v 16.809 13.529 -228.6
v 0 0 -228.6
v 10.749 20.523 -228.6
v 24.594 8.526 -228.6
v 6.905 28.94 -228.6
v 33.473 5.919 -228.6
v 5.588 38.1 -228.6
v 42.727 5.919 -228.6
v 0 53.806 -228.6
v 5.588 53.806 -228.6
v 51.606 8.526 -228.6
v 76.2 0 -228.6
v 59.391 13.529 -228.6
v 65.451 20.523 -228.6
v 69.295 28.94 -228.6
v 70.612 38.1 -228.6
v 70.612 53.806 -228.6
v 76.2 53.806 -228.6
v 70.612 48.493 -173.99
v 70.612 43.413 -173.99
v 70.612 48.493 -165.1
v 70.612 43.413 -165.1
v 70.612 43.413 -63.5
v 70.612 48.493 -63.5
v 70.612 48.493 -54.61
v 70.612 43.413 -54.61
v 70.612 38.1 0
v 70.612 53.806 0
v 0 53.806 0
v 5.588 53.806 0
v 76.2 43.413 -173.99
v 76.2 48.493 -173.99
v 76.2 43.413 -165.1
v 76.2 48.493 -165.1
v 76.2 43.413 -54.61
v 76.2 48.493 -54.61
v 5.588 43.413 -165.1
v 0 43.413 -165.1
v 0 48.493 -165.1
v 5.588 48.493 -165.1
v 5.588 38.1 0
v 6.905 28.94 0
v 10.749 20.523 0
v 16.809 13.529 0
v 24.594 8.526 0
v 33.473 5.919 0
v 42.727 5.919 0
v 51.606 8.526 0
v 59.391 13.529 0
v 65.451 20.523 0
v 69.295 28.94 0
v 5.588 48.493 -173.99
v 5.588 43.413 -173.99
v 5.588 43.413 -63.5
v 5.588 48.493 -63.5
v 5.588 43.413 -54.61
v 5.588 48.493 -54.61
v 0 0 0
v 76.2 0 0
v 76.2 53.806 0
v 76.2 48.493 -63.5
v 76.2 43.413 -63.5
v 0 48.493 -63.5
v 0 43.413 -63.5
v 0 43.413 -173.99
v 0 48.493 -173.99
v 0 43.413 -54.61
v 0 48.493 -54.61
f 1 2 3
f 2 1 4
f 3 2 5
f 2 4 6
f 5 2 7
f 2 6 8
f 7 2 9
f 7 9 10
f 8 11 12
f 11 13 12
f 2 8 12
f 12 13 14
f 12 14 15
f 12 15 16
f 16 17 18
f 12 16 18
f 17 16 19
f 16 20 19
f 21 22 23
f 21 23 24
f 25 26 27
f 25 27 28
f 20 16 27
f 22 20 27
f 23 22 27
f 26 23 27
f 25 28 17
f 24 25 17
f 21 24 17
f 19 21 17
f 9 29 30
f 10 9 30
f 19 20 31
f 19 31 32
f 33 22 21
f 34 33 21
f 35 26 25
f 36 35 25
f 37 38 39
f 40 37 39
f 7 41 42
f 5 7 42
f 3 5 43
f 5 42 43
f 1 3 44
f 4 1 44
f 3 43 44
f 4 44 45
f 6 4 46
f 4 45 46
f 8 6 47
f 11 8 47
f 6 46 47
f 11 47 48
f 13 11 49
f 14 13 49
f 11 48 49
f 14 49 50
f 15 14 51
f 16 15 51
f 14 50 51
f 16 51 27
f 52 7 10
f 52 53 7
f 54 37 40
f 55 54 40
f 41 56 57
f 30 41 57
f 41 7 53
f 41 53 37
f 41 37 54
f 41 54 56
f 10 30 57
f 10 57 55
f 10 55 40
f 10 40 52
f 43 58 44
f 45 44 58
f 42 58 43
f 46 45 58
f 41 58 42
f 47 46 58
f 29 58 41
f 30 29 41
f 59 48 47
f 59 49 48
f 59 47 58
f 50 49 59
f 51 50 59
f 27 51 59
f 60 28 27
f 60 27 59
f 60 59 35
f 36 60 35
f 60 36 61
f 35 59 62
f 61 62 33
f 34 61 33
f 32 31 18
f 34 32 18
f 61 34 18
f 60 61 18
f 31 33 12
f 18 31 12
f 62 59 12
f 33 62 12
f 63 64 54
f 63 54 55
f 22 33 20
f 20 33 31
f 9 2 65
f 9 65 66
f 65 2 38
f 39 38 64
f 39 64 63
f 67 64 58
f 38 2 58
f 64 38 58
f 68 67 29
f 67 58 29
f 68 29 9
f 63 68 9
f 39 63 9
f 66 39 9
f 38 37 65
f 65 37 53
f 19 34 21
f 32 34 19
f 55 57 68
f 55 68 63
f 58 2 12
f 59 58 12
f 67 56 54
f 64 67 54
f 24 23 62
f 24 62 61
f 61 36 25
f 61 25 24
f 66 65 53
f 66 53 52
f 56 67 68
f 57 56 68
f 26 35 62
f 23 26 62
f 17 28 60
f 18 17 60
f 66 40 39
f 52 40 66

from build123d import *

# Parameters (mm, degrees)
SKETCH1_W           = 76.2
SKETCH1_H           = 228.6
BOSS_EXTRUDE1_DEPTH = 38.1
SKETCH2_R           = 32.512
CUT_EXTRUDE2_DEPTH  = 244.959033446
SKETCH3_W           = 5.588
SKETCH3_H           = 15.705533419
BOSS_EXTRUDE2_DEPTH = 228.6
SKETCH4_W           = 8.89
SKETCH4_H           = 5.08
CUT_EXTRUDE3_DEPTH  = 247.899646469


with BuildPart() as part:
    # Sketch1 → Boss-Extrude1 (new body)
    with BuildSketch(Plane(origin=(0, 0, 0), x_dir=(1, 0, 0), z_dir=(0, 1, 0))):
        with Locations((38.1, 114.3)):
            Rectangle(SKETCH1_W, SKETCH1_H)
    extrude(amount=BOSS_EXTRUDE1_DEPTH)

    # Sketch2 → Cut-Extrude2 (cut, through all)
    with BuildSketch(Plane.XY):
        with Locations((38.1, 38.1)):
            Circle(SKETCH2_R)
    extrude(amount=-CUT_EXTRUDE2_DEPTH, mode=Mode.SUBTRACT)

    # Sketch3 → Boss-Extrude2 (add)
    with BuildSketch(Plane.XY):
        with Locations((2.794, 45.95276671)):
            Rectangle(SKETCH3_W, SKETCH3_H)
        with Locations((73.406, 45.95276671)):
            Rectangle(SKETCH3_W, SKETCH3_H)
    extrude(amount=-BOSS_EXTRUDE2_DEPTH)

    # Sketch4 → Cut-Extrude3 (cut, through all)
    with BuildSketch(Plane(origin=(76.2, 0, 0), x_dir=(0, 0, -1), z_dir=(1, 0, 0))):
        with Locations((59.055, 45.95276671)):
            Rectangle(SKETCH4_W, SKETCH4_H)
        with Locations((169.545, 45.95276671)):
            Rectangle(SKETCH4_W, SKETCH4_H)
    extrude(amount=-CUT_EXTRUDE3_DEPTH, mode=Mode.SUBTRACT)


solid = part.part
